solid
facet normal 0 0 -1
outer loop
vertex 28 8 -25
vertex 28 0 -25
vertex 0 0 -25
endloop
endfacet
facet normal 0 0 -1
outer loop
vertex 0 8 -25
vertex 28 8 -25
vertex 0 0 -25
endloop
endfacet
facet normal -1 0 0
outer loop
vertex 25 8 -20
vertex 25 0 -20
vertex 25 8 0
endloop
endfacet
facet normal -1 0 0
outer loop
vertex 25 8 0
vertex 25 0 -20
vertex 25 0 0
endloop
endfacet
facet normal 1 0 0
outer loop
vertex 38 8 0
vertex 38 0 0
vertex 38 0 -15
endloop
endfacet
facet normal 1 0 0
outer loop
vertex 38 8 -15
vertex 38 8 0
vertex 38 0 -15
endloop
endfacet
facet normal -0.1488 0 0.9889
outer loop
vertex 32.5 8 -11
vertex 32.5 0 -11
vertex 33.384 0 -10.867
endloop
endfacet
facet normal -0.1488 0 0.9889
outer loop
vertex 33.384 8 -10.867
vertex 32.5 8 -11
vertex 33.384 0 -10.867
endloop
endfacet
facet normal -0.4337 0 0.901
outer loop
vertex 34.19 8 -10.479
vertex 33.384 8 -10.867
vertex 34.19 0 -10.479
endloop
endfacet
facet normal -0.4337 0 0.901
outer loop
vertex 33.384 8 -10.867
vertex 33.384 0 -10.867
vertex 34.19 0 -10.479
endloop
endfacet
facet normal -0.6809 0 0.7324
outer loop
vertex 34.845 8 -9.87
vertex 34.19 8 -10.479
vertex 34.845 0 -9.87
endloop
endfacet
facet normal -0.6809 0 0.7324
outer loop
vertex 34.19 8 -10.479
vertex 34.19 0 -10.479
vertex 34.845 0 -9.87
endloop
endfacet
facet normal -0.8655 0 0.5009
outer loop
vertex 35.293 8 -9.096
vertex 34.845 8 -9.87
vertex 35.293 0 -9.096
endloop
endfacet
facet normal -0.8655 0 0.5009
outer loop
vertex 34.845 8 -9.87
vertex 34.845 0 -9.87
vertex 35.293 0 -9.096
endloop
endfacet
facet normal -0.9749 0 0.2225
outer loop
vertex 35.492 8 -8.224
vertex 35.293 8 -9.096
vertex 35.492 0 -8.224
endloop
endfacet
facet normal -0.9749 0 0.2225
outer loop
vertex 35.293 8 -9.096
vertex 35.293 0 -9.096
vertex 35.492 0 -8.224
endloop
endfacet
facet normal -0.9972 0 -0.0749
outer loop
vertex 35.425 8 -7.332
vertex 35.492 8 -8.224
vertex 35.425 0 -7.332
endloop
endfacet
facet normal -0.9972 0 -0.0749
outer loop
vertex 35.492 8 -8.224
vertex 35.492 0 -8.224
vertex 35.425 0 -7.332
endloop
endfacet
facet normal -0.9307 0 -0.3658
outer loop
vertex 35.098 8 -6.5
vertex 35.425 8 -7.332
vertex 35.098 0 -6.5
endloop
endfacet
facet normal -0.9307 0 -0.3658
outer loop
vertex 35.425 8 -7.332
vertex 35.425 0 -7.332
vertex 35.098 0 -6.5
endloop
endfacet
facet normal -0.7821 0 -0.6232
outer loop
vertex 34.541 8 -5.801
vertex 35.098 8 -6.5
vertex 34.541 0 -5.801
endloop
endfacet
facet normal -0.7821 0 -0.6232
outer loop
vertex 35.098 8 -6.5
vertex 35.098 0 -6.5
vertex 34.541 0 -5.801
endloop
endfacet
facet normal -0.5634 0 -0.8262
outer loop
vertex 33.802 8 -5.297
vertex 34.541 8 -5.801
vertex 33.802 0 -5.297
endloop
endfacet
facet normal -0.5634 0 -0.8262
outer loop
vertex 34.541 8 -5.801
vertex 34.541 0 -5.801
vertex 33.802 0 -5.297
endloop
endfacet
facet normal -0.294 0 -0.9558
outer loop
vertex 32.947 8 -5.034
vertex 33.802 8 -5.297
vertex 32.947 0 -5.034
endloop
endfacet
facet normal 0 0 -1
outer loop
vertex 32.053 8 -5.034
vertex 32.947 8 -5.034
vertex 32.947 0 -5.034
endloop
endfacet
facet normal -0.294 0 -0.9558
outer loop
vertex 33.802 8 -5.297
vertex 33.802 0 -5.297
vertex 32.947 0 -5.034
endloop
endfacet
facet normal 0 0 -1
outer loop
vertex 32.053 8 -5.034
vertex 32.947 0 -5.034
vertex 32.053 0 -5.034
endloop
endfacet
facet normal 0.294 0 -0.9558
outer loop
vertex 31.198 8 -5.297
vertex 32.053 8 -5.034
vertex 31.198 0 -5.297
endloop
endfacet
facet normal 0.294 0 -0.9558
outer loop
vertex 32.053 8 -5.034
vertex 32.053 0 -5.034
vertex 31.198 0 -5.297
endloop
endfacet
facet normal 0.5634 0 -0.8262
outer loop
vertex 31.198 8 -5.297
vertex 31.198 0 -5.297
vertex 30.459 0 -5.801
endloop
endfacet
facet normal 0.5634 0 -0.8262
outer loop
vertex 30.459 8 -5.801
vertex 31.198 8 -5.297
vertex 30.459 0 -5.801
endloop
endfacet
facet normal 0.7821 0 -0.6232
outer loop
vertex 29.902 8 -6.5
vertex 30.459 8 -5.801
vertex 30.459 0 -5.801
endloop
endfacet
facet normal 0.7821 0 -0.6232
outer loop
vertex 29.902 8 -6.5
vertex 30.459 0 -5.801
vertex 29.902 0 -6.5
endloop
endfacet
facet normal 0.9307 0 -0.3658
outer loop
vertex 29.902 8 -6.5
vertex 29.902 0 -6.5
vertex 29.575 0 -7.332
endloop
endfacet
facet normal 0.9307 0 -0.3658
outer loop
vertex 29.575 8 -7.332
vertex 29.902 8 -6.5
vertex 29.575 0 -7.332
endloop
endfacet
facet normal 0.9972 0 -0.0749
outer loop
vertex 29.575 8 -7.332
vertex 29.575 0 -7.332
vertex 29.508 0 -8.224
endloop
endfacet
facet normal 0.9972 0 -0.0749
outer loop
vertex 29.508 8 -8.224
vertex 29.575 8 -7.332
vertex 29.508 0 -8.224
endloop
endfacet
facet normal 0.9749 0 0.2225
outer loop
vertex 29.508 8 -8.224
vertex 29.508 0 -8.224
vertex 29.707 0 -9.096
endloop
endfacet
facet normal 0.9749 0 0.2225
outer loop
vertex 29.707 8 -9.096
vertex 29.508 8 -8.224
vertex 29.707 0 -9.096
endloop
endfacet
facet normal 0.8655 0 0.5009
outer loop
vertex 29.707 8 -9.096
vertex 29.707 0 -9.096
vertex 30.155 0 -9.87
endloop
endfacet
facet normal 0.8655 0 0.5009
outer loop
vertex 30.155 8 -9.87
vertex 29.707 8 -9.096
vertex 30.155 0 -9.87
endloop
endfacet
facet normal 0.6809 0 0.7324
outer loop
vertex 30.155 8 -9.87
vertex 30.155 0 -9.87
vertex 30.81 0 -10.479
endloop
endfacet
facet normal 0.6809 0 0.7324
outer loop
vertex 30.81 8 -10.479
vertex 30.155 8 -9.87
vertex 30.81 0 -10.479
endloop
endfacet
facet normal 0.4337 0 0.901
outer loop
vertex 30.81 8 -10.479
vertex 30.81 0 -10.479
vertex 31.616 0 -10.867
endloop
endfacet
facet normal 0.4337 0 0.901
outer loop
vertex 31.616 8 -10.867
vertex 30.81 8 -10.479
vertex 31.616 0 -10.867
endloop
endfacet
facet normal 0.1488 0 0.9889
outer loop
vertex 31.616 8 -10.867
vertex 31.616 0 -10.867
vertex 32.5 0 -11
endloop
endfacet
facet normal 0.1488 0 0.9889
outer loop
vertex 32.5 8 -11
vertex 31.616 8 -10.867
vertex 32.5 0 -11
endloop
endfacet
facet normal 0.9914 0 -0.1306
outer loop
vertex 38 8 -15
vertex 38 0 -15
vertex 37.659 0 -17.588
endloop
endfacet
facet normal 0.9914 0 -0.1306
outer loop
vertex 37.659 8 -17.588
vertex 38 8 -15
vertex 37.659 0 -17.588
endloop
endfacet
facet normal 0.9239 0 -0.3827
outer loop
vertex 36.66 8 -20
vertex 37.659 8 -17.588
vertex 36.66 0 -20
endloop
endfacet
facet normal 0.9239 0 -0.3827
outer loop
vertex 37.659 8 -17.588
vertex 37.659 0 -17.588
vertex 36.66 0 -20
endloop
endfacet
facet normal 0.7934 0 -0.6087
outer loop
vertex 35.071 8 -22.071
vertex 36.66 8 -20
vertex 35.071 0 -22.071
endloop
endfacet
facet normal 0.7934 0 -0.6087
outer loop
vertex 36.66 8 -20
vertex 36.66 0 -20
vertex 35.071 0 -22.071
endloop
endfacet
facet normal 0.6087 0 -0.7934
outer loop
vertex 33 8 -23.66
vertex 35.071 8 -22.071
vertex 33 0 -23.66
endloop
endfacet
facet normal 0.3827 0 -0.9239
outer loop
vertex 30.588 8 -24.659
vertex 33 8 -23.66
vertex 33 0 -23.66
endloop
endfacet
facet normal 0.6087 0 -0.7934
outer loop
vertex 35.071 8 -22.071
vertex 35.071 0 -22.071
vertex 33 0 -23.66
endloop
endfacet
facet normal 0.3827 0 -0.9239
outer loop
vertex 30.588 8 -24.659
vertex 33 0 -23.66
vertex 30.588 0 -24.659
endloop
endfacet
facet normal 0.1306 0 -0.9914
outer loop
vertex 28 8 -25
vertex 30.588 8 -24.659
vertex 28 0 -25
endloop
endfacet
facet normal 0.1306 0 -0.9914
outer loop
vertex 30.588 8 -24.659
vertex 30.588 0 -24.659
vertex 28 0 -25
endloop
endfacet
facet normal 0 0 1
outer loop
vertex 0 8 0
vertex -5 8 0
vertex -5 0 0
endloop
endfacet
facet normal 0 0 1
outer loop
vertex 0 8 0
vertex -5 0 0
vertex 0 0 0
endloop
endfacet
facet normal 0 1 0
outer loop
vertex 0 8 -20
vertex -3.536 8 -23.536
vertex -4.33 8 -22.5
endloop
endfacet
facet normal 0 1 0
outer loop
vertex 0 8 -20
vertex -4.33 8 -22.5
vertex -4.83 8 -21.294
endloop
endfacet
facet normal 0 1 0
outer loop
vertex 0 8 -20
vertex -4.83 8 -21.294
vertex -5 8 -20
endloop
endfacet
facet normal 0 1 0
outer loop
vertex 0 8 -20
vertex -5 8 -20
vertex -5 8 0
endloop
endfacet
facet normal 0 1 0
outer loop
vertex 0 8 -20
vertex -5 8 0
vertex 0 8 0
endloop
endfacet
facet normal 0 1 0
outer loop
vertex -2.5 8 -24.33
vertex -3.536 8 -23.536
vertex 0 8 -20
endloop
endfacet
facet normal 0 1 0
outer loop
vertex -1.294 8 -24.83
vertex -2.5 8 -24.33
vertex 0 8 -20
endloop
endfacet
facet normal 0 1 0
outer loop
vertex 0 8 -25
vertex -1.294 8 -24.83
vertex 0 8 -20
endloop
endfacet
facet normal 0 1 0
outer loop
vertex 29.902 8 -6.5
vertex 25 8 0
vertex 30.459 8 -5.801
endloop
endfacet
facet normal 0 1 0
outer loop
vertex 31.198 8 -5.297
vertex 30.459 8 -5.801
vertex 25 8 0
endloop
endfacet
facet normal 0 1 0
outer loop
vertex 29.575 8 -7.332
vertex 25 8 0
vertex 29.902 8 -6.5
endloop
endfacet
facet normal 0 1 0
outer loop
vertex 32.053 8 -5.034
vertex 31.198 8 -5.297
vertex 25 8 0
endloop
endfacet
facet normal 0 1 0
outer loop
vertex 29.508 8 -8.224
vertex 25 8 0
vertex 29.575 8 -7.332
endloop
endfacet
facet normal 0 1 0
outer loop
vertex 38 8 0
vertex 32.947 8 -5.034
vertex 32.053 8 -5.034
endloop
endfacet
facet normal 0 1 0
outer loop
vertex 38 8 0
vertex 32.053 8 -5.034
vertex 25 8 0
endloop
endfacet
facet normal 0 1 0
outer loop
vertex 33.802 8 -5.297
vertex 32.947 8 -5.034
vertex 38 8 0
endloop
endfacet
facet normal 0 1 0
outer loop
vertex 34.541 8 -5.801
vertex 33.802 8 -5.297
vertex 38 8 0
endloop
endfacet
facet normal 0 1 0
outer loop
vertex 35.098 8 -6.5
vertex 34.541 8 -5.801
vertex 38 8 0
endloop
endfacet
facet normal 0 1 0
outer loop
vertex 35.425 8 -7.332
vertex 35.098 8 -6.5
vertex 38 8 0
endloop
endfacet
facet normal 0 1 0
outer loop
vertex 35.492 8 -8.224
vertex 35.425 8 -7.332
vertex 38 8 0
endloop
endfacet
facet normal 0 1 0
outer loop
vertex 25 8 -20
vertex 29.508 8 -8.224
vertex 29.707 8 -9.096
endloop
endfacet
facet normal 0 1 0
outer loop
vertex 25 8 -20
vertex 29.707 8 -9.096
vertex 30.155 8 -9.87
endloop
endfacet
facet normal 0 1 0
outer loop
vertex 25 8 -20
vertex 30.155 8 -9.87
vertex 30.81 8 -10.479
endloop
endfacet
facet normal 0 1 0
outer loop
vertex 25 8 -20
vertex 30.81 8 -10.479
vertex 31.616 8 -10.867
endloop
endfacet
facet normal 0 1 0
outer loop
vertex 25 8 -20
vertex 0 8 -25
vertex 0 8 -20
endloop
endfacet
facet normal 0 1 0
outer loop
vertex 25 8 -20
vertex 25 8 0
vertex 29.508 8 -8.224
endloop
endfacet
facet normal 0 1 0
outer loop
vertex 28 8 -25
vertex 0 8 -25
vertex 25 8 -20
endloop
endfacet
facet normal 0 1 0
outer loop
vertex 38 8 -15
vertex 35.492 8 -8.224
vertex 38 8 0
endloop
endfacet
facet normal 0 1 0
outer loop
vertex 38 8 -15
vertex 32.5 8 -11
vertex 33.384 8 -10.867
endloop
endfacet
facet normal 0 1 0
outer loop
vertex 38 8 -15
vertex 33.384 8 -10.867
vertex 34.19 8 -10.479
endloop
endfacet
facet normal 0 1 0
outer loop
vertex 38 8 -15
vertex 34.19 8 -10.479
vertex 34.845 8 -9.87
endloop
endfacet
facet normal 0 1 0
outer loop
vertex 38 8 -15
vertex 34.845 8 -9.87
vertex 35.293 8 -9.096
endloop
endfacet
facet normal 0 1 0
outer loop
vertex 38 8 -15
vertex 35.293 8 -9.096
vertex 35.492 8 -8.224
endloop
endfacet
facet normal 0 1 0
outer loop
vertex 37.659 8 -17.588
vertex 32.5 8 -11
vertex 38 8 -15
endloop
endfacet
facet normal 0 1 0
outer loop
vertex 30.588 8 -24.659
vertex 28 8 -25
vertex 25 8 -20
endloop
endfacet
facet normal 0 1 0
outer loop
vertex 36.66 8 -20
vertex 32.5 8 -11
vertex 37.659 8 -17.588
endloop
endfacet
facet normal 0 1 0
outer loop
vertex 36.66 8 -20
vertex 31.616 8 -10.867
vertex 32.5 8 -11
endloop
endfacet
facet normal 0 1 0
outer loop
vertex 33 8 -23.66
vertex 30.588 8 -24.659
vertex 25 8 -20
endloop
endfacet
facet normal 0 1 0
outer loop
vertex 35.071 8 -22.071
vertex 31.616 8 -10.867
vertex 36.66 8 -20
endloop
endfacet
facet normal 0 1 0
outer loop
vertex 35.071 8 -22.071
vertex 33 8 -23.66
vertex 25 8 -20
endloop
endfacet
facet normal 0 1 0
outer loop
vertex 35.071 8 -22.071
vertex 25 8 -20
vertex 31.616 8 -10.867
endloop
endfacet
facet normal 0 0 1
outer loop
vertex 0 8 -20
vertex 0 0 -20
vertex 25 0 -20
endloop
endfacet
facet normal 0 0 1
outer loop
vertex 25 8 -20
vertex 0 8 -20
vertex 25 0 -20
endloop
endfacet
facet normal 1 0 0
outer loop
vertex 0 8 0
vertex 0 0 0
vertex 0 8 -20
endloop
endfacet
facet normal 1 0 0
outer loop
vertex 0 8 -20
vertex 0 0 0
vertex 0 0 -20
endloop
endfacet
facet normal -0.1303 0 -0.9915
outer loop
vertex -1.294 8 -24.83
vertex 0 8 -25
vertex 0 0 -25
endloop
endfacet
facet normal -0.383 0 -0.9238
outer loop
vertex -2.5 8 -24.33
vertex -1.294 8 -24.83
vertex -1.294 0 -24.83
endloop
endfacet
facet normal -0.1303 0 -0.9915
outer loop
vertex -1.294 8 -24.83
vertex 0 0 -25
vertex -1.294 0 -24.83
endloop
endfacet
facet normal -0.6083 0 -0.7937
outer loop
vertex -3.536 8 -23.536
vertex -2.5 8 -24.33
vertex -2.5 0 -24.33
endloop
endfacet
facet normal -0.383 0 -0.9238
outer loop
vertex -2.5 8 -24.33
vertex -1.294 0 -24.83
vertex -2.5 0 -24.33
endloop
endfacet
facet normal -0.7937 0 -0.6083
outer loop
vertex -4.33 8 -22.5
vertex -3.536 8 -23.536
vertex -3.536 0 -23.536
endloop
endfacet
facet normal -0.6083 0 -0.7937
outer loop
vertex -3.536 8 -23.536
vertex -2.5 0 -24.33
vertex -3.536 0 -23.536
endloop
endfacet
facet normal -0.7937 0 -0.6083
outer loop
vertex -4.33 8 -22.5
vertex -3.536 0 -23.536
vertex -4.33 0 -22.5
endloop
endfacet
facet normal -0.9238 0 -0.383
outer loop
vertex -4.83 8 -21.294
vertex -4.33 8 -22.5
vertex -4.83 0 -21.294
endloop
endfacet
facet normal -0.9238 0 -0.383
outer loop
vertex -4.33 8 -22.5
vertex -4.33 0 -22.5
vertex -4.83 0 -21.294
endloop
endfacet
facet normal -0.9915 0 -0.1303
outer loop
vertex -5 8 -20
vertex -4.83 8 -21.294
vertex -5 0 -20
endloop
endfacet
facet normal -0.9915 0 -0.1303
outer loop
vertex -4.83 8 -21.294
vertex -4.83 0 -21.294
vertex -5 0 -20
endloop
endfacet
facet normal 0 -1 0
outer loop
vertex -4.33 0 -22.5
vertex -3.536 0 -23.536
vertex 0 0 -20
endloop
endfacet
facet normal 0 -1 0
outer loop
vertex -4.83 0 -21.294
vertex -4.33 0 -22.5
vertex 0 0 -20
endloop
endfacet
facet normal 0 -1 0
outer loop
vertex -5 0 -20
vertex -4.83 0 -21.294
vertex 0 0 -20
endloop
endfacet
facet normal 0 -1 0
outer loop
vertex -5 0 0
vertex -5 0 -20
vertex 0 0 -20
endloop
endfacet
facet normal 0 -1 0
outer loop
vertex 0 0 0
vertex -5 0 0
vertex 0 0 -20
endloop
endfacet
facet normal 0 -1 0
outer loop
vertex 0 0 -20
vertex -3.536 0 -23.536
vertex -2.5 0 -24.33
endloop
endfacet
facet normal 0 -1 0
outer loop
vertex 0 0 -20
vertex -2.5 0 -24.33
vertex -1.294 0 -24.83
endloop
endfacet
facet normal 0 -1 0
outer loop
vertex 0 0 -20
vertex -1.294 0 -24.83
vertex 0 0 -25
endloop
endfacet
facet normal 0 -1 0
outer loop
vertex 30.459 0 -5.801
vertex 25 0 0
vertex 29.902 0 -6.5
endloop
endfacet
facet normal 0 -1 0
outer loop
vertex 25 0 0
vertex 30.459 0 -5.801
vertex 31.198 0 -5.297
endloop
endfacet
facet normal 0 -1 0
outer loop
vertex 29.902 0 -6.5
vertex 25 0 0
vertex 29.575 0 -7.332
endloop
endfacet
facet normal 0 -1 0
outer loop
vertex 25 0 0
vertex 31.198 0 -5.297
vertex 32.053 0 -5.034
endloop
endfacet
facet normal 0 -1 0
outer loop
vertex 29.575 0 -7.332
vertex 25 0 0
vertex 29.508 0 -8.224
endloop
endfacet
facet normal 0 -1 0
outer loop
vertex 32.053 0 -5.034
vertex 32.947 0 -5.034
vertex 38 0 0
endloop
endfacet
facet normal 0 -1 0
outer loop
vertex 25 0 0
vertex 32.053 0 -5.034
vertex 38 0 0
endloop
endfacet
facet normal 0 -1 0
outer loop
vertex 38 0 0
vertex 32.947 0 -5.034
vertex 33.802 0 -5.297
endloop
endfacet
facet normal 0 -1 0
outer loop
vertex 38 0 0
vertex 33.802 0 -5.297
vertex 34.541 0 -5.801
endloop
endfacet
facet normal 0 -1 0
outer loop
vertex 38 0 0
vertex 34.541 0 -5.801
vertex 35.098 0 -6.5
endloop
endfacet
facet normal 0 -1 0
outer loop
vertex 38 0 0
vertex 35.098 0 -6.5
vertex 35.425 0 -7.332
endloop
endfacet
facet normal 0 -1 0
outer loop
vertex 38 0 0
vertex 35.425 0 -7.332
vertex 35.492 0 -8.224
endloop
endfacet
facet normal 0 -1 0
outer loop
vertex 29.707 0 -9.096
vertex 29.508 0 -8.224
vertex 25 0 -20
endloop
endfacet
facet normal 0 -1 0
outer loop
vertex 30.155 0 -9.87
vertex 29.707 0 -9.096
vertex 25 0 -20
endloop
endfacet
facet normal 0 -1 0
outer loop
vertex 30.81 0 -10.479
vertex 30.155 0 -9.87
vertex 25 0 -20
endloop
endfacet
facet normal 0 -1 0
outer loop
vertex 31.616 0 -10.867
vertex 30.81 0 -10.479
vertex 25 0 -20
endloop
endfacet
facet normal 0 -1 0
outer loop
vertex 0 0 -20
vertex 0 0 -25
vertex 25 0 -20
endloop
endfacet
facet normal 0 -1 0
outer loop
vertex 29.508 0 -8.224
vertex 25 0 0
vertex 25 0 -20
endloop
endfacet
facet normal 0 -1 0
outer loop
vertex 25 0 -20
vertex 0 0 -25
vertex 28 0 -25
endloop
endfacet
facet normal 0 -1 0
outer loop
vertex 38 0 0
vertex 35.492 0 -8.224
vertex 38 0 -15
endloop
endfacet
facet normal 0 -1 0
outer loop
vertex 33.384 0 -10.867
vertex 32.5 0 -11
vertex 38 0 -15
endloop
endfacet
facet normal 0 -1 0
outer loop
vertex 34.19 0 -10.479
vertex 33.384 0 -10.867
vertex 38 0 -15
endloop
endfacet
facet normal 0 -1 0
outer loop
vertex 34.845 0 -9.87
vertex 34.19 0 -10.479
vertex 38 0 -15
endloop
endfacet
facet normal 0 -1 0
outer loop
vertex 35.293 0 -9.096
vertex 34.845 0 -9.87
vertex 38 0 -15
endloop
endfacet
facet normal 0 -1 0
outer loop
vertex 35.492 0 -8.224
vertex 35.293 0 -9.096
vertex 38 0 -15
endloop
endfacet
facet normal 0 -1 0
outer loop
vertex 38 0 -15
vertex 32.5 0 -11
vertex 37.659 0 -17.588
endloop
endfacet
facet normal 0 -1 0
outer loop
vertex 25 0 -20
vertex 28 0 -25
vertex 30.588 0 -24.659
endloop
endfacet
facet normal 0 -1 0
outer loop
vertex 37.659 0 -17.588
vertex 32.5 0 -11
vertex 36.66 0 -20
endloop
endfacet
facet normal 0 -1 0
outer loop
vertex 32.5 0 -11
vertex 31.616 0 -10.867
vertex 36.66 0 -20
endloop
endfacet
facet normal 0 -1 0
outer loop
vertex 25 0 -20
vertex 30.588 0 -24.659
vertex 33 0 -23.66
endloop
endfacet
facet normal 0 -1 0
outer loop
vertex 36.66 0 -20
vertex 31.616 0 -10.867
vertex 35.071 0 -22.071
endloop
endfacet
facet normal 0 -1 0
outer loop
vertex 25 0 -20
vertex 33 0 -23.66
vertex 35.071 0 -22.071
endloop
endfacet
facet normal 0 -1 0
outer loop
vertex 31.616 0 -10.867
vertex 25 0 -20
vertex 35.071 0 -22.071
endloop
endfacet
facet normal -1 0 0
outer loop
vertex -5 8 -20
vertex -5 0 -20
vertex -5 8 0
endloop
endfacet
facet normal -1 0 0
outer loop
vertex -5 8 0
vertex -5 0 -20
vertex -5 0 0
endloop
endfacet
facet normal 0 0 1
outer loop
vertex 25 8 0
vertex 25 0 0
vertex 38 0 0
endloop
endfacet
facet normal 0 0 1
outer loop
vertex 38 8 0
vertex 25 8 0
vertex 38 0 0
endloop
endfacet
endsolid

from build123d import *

# Parameters (mm, degrees)
CROQUIS1_R              = 2
SALIENTE_EXTRUIR1_DEPTH = 8
CROQUIS2_R              = 3
CORTAR_EXTRUIR1_DEPTH   = 9


with BuildPart() as part:
    # Croquis1 → Saliente-Extruir1 (new body)
    with BuildSketch(Plane(origin=(0, 0, 0), x_dir=(1, 0, 0), z_dir=(0, 1, 0))):
        with BuildLine():
            Line((25, 0), (38, 0))
            Line((38, 0), (38, 15))
            ThreePointArc((38, 15), (35.071067812, 22.071067812), (28, 25))
            Line((28, 25), (0, 25))
            ThreePointArc((0, 25), (-3.535533906, 23.535533906), (-5, 20))
            Line((-5, 20), (-5, 0))
            Line((-5, 0), (0, 0))
            Line((0, 0), (0, 20))
            Line((0, 20), (25, 20))
            Line((25, 20), (25, 0))
        make_face()
        with Locations(Location((32.5, 8, 0), (0, 0, 270))):
            Circle(CROQUIS1_R, mode=Mode.SUBTRACT)
    extrude(amount=SALIENTE_EXTRUIR1_DEPTH)

    # Croquis2 → Cortar-Extruir1 (cut)
    with BuildSketch(Plane.XZ):
        with Locations(Location((32.5, -8, 0), (0, 0, 270))):
            Circle(CROQUIS2_R)
    extrude(amount=-CORTAR_EXTRUIR1_DEPTH, mode=Mode.SUBTRACT)


solid = part.part
